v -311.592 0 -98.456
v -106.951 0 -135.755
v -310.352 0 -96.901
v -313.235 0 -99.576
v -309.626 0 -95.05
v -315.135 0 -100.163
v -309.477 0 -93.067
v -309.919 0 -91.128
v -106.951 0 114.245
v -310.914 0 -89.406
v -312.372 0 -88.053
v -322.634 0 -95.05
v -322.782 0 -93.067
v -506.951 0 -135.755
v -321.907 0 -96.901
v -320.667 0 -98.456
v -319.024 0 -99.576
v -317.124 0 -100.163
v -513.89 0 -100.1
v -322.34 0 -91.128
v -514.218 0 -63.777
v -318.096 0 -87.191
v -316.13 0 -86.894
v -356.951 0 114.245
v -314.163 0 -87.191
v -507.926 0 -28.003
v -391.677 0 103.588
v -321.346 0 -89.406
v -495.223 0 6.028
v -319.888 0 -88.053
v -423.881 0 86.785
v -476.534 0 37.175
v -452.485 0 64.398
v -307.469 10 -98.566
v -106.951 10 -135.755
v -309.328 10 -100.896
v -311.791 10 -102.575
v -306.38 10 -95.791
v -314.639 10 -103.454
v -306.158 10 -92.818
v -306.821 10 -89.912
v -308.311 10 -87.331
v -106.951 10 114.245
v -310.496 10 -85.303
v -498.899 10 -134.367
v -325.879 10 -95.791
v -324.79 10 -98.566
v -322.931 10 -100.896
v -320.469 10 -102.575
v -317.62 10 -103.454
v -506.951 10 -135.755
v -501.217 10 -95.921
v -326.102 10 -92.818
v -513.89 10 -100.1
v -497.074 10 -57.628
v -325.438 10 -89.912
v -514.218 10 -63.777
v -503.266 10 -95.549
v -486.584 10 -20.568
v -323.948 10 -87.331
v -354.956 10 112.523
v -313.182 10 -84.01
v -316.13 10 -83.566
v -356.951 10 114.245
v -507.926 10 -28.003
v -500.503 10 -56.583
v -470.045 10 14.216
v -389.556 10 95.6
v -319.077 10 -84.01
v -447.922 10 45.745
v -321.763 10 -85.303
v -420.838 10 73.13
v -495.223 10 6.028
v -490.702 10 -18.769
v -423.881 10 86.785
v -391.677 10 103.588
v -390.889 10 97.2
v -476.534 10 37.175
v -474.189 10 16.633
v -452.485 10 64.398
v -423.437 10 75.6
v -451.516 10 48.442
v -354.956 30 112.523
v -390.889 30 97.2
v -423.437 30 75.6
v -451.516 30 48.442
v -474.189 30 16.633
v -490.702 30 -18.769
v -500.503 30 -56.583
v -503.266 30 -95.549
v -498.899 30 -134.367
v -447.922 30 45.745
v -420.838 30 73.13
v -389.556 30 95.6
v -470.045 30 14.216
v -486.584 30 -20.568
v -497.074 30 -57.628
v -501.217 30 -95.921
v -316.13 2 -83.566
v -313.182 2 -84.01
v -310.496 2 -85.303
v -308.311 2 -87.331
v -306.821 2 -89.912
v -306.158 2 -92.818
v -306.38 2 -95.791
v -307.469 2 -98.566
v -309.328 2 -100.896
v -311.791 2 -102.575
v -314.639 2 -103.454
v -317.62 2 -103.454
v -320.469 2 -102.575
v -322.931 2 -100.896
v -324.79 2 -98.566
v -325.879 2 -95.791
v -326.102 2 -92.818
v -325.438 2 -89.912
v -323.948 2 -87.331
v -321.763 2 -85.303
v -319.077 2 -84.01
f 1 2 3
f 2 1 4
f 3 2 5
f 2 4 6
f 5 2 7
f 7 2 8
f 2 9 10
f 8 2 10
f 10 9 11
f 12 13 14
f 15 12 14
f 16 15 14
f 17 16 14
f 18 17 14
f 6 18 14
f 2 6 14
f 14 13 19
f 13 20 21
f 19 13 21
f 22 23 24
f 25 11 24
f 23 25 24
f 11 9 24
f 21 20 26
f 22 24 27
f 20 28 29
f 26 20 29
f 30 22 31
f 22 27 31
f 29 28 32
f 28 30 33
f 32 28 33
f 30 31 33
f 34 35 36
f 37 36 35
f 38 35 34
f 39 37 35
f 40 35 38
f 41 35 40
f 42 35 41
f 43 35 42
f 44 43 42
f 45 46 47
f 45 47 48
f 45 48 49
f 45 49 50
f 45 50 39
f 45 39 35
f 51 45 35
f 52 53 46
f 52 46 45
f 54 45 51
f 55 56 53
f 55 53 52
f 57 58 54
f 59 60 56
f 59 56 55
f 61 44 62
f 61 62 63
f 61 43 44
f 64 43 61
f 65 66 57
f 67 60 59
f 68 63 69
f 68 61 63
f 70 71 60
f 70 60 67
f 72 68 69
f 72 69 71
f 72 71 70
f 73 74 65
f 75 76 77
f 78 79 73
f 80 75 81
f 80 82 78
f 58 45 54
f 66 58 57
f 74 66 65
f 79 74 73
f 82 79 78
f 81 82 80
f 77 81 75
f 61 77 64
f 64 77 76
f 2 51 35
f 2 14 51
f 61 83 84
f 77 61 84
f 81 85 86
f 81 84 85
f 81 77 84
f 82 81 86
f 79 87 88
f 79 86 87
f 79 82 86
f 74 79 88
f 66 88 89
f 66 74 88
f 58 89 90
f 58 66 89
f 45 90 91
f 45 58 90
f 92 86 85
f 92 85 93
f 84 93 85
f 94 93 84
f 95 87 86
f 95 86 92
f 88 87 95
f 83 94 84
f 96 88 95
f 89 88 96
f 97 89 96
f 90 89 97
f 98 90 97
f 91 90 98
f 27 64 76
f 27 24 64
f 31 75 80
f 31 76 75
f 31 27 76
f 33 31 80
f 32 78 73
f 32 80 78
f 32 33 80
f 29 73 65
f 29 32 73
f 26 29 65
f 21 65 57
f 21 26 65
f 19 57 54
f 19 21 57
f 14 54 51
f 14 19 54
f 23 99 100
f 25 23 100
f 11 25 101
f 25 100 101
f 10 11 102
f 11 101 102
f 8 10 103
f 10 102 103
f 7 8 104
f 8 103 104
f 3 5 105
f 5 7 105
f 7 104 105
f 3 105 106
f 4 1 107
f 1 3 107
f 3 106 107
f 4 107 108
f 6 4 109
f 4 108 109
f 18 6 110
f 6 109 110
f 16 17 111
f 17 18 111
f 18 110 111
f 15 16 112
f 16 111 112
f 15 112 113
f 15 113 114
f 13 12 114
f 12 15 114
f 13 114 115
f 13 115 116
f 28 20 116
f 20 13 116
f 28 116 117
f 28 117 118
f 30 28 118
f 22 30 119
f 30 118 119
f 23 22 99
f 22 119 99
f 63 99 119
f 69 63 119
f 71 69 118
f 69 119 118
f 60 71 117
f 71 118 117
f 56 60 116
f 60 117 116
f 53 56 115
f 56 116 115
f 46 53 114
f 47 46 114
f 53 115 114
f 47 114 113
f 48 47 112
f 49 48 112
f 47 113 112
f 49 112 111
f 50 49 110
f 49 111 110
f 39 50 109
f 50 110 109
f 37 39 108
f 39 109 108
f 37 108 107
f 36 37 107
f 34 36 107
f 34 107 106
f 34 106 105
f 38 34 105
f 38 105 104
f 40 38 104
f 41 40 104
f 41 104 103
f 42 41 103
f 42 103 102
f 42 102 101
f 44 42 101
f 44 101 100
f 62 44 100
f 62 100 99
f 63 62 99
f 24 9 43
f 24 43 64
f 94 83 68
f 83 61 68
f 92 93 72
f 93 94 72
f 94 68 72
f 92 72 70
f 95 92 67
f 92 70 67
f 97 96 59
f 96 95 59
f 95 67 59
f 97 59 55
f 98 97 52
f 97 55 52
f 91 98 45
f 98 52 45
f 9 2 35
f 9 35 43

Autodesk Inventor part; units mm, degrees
ref_plane "YZ Plane" through (0, 0, 0) normal (1, 0, 0) x (0, 1, 0)
ref_plane "XZ Plane" through (0, 0, 0) normal (0, 1, 0) x (-1, 0, 0)
ref_plane "XY Plane" through (0, 0, 0) normal (0, 0, 1) x (1, 0, 0)
sketch "Sketch1" plane through (0, 0, 0) normal (0, 1, 0) x (-1, 0, 0)
  point P0 (0, 0)
sketch "Sketch2" plane through (0, 0, 0) normal (0, 1, 0) x (-1, 0, 0)
  line L0 (506.9511, -135.755) -> (106.9511, -135.755)
  line L1 (106.9511, -135.755) -> (106.9511, 114.245)
  line L2 (106.9511, 114.245) -> (356.9511, 114.245)
  arc A0 (506.9511, -135.755) -> (356.9511, 114.245) centre (316.293, -80.1499) ccw
  point P0 (0, 0)
  dimension "d0" = 400
  dimension "d1" = 250
  dimension "d2" = 250
sketch "Sketch3" plane through (0, 0, 0) normal (0, 1, 0) x (-1, 0, 0)
  point P0 (0, 0)
extrude "Extrusion1" add sketch "Sketch2" along normal blind 10
sketch "Sketch4" plane through (0, 10, 0) normal (0, 1, 0) x (1, 0, 0)
  point P0 (0, 0)
  point P1 (-316.1297, 93.5657)
hole "Hole1" at (-316.1297, 10, -93.5657) direction (0, -1, 0) diameter 20 depth 8 tip angle 118
sketch "Sketch5" plane through (0, 10, 0) normal (0, 1, 0) x (1, 0, 0)
  arc A0 (-498.8992, 134.3673) -> (-354.956, -112.5228) centre (-289.3431, 91.1376) ccw
  arc A1 (-498.8992, 134.3673) -> (-354.956, -112.5228) centre (-271.7766, 101.3793) ccw
  point P0 (0, 0)
extrude "Extrusion2" add sketch "Sketch5" along normal blind 20
properties part number "glassplane"
